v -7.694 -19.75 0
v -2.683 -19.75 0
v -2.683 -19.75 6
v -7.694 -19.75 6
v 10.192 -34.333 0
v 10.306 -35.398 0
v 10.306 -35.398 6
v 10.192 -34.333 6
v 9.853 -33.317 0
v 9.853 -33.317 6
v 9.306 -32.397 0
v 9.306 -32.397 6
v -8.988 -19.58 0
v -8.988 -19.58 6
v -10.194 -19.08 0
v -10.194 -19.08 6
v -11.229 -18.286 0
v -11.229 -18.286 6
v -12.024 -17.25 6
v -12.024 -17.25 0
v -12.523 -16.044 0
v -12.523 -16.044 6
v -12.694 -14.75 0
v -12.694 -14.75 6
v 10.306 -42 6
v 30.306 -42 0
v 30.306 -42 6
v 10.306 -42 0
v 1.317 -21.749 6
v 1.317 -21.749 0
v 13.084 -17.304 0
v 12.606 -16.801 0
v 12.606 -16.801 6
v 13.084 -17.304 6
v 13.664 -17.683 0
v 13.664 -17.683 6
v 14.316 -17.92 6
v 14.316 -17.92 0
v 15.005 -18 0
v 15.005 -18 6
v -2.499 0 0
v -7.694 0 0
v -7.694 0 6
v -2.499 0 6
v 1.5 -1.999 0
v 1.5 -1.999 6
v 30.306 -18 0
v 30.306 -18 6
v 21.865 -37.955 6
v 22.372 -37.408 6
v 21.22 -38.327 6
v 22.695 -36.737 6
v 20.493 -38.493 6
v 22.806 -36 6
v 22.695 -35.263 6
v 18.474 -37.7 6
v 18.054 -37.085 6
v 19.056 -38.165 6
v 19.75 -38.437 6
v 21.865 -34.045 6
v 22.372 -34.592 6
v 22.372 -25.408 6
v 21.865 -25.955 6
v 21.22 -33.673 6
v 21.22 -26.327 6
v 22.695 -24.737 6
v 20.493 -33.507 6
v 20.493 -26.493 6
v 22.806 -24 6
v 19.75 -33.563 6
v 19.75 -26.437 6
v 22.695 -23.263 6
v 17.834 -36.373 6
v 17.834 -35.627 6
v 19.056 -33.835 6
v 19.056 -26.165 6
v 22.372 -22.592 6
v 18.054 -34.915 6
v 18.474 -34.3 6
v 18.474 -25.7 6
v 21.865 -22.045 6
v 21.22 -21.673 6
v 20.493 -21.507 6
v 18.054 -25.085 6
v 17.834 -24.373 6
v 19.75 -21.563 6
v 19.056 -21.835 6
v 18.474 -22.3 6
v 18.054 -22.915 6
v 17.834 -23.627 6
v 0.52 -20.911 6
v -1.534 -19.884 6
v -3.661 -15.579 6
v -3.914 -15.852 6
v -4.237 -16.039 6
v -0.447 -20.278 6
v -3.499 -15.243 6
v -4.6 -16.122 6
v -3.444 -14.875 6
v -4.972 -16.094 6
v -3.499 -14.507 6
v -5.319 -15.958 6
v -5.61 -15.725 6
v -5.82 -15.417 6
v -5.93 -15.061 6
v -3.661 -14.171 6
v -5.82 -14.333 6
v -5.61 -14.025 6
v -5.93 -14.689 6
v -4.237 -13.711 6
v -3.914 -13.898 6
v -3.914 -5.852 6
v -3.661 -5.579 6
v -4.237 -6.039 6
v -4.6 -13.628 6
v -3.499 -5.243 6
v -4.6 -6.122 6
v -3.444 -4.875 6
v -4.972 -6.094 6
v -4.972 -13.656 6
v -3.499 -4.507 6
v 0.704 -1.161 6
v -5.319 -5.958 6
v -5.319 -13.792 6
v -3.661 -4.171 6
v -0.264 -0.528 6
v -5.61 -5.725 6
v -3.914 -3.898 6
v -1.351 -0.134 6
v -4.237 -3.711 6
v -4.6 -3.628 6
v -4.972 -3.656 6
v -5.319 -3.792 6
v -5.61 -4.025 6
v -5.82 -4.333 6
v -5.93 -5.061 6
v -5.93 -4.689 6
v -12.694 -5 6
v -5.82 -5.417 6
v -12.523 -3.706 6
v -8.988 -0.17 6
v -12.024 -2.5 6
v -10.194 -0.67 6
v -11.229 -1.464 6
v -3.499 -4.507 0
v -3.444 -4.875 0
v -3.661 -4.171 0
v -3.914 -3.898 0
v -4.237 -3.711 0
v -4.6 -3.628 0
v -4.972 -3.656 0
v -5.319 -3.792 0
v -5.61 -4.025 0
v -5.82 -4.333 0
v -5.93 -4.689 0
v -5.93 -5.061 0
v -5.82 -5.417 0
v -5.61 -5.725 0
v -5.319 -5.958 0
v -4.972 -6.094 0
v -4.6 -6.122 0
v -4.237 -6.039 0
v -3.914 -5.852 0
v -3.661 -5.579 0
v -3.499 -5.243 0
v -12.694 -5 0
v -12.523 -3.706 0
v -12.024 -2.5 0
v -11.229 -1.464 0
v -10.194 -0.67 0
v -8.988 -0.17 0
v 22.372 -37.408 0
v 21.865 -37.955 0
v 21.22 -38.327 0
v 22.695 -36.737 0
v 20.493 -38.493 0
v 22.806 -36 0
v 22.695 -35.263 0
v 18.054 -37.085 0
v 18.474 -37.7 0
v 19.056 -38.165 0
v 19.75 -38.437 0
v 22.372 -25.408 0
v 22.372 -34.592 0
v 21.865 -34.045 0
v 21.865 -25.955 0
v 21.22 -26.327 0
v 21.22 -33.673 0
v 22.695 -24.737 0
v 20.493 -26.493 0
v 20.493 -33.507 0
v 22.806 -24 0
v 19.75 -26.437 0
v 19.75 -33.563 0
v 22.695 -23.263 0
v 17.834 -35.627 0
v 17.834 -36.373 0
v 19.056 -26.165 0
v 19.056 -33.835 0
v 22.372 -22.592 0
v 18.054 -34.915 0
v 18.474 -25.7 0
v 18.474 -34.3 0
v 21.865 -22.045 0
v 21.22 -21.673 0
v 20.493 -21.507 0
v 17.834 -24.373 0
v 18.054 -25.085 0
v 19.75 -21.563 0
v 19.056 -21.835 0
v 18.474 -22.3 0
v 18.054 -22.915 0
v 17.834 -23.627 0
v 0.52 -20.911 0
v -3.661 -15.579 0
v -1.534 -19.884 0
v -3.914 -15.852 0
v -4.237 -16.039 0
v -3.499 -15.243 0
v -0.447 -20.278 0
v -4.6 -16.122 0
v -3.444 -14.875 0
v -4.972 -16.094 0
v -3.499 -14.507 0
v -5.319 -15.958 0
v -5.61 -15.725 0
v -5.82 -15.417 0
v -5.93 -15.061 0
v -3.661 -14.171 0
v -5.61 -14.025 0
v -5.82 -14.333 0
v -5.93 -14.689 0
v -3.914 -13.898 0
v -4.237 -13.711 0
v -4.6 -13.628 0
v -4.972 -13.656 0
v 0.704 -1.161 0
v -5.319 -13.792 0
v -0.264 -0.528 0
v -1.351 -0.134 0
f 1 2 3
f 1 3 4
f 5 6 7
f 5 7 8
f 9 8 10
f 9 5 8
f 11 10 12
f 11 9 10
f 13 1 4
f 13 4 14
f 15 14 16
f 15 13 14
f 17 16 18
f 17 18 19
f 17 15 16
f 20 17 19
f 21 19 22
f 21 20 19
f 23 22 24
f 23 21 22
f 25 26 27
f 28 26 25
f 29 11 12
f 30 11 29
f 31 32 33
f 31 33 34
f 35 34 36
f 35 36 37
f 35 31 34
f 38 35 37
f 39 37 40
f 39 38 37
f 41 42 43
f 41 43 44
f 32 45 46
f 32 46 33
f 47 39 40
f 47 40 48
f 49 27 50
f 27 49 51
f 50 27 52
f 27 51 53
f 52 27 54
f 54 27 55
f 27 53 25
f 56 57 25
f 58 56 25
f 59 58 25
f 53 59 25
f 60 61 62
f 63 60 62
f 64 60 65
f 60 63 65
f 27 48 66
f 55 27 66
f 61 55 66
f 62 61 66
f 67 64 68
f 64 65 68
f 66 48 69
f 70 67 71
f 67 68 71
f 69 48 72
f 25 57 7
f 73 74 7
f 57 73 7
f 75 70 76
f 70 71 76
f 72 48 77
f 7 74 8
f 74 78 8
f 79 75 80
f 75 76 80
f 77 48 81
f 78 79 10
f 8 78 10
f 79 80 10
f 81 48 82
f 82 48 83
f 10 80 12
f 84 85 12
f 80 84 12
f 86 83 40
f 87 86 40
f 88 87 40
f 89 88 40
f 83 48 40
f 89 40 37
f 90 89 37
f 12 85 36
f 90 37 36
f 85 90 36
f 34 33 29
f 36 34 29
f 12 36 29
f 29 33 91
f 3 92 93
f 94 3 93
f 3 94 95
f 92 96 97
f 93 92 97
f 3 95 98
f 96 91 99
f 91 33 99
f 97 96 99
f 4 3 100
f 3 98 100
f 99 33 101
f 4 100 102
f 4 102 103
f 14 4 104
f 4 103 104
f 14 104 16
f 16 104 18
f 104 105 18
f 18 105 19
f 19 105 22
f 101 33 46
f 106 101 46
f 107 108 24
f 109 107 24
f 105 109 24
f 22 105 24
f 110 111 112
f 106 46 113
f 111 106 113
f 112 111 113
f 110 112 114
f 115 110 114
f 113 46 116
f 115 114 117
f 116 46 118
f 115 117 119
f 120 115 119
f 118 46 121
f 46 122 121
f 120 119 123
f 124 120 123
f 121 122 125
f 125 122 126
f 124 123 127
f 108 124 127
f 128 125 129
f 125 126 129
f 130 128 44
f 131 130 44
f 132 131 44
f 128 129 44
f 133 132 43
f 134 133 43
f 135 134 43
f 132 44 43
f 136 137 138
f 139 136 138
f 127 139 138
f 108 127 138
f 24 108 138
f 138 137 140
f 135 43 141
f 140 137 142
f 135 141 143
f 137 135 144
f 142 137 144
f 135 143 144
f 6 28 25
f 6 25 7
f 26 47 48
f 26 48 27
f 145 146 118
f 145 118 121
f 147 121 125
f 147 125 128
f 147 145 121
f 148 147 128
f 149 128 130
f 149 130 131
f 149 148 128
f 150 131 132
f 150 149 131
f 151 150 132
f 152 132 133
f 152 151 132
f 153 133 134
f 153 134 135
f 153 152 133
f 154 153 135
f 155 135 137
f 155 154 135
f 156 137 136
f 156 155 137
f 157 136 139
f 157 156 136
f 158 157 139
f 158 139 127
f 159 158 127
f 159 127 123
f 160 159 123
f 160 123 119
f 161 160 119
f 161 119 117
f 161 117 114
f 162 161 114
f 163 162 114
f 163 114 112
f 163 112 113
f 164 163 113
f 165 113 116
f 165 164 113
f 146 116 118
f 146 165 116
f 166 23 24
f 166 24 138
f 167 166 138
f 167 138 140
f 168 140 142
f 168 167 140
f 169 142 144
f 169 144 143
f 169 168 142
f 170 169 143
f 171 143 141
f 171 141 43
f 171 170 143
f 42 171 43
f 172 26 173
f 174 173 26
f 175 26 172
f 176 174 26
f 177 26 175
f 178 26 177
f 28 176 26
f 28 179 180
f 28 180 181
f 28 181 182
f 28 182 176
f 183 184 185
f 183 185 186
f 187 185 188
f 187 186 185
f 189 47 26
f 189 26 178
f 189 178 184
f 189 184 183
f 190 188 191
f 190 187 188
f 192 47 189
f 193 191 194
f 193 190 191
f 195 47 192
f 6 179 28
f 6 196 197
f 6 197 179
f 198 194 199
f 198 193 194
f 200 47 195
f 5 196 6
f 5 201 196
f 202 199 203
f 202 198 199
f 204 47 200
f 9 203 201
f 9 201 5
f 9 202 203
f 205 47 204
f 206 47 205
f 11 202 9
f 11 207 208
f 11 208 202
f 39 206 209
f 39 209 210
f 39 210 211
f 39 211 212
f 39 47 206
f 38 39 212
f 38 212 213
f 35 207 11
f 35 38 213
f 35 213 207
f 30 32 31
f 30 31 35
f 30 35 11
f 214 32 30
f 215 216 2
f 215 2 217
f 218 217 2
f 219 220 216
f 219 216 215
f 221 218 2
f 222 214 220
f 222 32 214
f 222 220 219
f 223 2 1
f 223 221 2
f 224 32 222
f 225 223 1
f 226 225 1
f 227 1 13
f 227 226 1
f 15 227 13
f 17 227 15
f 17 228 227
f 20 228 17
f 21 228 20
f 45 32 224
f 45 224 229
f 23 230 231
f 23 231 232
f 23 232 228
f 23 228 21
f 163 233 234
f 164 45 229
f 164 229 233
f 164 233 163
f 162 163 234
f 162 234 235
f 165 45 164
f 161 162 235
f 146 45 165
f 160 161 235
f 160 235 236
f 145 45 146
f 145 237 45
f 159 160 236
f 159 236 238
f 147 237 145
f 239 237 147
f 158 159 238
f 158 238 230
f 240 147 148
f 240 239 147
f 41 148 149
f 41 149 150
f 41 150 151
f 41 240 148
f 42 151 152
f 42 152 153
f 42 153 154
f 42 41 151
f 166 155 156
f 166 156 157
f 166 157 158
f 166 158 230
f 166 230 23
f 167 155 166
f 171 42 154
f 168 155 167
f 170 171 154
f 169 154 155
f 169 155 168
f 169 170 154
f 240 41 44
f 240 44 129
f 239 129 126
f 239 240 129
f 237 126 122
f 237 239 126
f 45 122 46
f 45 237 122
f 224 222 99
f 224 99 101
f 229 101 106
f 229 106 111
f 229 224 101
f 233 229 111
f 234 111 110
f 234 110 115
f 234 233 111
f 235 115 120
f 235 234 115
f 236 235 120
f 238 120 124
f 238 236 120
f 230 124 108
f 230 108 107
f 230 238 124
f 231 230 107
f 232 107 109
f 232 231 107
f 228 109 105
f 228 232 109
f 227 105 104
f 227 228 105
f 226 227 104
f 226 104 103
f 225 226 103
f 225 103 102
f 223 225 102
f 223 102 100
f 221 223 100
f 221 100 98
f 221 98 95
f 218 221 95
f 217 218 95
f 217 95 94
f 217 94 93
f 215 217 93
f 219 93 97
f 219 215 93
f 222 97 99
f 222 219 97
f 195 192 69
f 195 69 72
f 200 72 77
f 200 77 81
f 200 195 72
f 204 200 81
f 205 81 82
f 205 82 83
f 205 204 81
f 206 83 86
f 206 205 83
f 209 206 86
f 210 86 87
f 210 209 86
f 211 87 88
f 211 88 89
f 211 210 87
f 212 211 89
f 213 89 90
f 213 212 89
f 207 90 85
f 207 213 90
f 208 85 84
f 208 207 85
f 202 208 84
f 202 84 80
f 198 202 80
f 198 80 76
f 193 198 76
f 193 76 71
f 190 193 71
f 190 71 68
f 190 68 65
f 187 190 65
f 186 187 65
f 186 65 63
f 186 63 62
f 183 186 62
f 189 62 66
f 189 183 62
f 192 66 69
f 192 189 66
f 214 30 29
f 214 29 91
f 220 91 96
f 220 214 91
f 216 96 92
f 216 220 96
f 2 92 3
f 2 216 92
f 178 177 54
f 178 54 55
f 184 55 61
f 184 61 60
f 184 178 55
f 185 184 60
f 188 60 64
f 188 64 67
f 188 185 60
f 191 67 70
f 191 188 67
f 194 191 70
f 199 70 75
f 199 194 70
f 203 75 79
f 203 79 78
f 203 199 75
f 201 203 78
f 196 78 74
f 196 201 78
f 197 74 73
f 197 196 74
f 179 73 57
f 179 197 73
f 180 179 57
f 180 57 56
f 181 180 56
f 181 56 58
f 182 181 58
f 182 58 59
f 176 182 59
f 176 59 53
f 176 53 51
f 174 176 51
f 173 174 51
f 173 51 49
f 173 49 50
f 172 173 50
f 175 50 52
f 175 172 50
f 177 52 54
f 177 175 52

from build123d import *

# Parameters (mm, degrees)
SKETCH_1_R      = 2.5
SKETCH_1_R_2    = 1.25
EXTRUDE_1_DEPTH = 6


with BuildPart() as part:
    # 草图1 → 凸台-拉伸1 (new body)
    with BuildSketch(Plane.XY):
        with BuildLine():
            Line((1.500025947, -1.999165895), (12.605850611, -16.800500463))
            ThreePointArc((12.605850611, -16.800500463), (13.664114192, -17.683421453), (15.005475182, -18))
            Line((15.005475182, -18), (30.306366751, -18))
            Line((30.306366751, -18), (30.306366751, -32.6148543))
            Line((30.306366751, -32.6148543), (30.306366751, -42))
            Line((30.306366751, -42), (10.306366751, -42))
            Line((10.306366751, -42), (10.306366751, -35.397540485))
            ThreePointArc((10.306366751, -35.397540485), (10.049618348, -33.815907061), (9.305741036, -32.39670638))
            Line((9.305741036, -32.39670638), (1.316615651, -21.749165895))
            ThreePointArc((1.316615651, -21.749165895), (-0.447156984, -20.277630912), (-2.682758634, -19.75))
            Line((-2.682758634, -19.75), (-7.693633249, -19.75))
            ThreePointArc((-7.693633249, -19.75), (-11.229167155, -18.285533906), (-12.693633249, -14.75))
            Line((-12.693633249, -14.75), (-12.693633249, -5))
            ThreePointArc((-12.693633249, -5), (-11.229167155, -1.464466094), (-7.693633249, 0))
            Line((-7.693633249, 0), (-2.499348338, 0))
            ThreePointArc((-2.499348338, 0), (-0.263746688, -0.527630912), (1.500025947, -1.999165895))
        make_face()
        with Locations((20.306366751, -36)):
            Circle(SKETCH_1_R, mode=Mode.SUBTRACT)
        with Locations((20.306366751, -24)):
            Circle(SKETCH_1_R, mode=Mode.SUBTRACT)
        with Locations((-4.693633249, -4.875)):
            Circle(SKETCH_1_R_2, mode=Mode.SUBTRACT)
        with Locations((-4.693633249, -14.875)):
            Circle(SKETCH_1_R_2, mode=Mode.SUBTRACT)
    extrude(amount=EXTRUDE_1_DEPTH)


solid = part.part
